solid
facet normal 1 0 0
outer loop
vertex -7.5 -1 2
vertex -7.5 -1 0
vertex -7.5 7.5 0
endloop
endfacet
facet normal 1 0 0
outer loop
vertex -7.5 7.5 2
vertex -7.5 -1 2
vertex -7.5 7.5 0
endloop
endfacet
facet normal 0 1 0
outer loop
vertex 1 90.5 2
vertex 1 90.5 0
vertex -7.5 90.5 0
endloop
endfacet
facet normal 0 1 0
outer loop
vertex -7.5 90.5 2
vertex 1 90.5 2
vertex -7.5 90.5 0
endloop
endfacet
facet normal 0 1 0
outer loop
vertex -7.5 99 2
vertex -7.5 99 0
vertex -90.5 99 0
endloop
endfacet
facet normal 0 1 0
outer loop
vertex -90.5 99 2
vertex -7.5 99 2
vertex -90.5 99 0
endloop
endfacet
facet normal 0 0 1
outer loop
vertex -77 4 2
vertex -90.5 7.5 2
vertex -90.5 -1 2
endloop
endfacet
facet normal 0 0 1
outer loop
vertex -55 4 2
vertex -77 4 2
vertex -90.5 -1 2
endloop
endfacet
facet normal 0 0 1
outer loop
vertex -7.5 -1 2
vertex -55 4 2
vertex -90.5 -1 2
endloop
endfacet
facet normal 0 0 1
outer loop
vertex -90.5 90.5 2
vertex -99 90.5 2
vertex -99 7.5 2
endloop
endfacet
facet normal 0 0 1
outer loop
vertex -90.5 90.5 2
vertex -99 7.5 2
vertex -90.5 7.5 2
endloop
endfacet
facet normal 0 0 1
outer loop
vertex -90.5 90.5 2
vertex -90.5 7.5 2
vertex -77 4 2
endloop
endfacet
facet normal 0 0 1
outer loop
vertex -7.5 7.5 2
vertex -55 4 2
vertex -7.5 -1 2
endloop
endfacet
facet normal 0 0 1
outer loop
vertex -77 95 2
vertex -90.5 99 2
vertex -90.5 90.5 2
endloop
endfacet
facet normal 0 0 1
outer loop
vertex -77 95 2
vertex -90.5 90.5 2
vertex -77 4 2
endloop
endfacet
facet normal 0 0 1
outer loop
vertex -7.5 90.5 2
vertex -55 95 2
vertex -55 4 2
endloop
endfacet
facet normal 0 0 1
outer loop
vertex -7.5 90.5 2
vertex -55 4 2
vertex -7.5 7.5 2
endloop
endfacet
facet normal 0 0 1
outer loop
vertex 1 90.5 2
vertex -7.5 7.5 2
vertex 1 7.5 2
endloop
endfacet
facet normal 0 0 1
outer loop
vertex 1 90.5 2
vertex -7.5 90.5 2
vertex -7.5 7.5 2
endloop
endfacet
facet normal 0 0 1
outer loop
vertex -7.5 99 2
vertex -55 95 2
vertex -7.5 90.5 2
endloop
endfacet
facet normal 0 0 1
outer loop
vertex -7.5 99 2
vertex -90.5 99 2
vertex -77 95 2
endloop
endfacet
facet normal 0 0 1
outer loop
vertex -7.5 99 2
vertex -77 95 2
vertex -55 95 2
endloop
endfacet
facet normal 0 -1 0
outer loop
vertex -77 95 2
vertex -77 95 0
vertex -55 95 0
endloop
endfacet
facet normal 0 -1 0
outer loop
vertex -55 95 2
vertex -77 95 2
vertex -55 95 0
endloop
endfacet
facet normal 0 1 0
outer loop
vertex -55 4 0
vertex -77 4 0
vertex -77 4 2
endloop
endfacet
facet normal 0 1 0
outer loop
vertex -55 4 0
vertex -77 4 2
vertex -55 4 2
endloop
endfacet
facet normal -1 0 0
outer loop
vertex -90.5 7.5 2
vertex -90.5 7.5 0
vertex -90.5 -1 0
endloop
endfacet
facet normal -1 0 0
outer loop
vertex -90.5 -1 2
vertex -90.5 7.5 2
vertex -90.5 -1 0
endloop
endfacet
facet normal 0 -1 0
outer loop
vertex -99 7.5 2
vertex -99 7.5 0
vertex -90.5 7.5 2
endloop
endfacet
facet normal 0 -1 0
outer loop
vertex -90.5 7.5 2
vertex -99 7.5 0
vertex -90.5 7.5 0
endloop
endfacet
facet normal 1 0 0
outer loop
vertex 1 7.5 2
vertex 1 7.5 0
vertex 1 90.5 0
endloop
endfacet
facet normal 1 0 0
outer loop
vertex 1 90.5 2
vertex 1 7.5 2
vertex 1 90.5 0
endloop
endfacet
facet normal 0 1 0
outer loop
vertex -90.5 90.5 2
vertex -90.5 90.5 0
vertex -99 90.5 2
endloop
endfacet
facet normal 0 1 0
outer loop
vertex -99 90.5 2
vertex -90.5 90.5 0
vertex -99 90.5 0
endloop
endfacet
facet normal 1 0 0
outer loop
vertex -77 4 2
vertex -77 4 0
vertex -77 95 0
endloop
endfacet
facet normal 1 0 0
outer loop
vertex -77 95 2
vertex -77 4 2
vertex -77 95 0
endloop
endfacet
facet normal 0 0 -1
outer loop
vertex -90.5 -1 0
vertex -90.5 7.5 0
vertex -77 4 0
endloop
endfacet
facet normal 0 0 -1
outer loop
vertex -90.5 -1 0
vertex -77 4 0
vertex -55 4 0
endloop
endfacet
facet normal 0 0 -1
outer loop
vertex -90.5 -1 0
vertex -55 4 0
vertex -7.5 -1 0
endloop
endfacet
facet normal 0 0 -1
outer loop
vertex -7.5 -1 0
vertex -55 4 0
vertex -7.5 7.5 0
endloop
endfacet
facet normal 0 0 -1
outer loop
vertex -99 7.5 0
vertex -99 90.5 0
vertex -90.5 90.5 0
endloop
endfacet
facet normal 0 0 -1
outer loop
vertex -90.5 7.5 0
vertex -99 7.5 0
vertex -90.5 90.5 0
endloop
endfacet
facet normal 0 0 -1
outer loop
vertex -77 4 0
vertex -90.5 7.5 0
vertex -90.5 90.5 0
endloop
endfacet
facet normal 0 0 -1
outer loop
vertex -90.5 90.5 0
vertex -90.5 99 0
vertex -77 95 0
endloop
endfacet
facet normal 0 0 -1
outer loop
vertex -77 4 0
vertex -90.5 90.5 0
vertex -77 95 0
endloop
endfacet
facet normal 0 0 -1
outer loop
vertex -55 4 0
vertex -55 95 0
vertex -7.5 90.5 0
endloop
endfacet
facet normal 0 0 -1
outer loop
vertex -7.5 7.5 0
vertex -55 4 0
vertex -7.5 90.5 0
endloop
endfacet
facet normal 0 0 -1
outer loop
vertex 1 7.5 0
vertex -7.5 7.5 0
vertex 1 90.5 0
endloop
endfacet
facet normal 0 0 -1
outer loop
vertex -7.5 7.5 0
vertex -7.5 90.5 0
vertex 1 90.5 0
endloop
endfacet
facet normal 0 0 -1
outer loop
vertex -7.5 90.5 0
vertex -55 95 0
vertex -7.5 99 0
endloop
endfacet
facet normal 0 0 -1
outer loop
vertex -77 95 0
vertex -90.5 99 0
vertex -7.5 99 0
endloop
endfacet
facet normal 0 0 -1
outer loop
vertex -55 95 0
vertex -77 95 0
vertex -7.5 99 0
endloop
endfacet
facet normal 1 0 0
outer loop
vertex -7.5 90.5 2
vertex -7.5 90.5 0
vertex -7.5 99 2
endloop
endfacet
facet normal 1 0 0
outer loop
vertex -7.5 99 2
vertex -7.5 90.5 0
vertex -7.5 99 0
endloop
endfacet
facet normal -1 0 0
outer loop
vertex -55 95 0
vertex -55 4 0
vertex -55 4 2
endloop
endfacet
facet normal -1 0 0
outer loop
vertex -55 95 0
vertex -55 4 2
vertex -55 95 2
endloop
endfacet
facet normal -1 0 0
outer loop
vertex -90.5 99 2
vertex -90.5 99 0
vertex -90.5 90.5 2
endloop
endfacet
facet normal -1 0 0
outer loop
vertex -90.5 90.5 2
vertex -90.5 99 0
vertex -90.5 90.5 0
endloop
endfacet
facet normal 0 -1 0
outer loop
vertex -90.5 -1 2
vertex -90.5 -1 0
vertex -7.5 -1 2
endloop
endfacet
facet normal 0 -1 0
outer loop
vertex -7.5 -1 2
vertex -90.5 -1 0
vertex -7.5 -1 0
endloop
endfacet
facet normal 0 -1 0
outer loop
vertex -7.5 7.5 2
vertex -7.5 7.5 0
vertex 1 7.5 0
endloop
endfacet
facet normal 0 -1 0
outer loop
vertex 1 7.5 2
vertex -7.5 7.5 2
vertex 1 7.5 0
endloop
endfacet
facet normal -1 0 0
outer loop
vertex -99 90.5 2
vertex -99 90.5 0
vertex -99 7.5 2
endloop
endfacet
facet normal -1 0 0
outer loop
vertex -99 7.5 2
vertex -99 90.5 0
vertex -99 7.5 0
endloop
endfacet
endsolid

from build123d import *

# Parameters (mm, degrees)
BOSS_EXTRUDE1_DEPTH = 2
SKETCH1_5_W         = 22
SKETCH1_5_H         = 91
CUT_EXTRUDE1_DEPTH  = 3


with BuildPart() as part:
    # Sketch1 → Boss-Extrude1 (new body)
    with BuildSketch(Plane.XY):
        Polygon((-99, 90.5), (-99, 7.5), (-90.5, 7.5), (-90.5, -1), (-7.5, -1), (-7.5, 7.5), (1, 7.5), (1, 90.5), (-7.5, 90.5), (-7.5, 99), (-90.5, 99), (-90.5, 90.5), align=None)
    extrude(amount=BOSS_EXTRUDE1_DEPTH)

    # Sketch1<5> → Cut-Extrude1 (cut, through all)
    with BuildSketch(Plane.XY):
        with Locations((-66, 49.5)):
            Rectangle(SKETCH1_5_W, SKETCH1_5_H)
    extrude(amount=CUT_EXTRUDE1_DEPTH, mode=Mode.SUBTRACT)


solid = part.part
